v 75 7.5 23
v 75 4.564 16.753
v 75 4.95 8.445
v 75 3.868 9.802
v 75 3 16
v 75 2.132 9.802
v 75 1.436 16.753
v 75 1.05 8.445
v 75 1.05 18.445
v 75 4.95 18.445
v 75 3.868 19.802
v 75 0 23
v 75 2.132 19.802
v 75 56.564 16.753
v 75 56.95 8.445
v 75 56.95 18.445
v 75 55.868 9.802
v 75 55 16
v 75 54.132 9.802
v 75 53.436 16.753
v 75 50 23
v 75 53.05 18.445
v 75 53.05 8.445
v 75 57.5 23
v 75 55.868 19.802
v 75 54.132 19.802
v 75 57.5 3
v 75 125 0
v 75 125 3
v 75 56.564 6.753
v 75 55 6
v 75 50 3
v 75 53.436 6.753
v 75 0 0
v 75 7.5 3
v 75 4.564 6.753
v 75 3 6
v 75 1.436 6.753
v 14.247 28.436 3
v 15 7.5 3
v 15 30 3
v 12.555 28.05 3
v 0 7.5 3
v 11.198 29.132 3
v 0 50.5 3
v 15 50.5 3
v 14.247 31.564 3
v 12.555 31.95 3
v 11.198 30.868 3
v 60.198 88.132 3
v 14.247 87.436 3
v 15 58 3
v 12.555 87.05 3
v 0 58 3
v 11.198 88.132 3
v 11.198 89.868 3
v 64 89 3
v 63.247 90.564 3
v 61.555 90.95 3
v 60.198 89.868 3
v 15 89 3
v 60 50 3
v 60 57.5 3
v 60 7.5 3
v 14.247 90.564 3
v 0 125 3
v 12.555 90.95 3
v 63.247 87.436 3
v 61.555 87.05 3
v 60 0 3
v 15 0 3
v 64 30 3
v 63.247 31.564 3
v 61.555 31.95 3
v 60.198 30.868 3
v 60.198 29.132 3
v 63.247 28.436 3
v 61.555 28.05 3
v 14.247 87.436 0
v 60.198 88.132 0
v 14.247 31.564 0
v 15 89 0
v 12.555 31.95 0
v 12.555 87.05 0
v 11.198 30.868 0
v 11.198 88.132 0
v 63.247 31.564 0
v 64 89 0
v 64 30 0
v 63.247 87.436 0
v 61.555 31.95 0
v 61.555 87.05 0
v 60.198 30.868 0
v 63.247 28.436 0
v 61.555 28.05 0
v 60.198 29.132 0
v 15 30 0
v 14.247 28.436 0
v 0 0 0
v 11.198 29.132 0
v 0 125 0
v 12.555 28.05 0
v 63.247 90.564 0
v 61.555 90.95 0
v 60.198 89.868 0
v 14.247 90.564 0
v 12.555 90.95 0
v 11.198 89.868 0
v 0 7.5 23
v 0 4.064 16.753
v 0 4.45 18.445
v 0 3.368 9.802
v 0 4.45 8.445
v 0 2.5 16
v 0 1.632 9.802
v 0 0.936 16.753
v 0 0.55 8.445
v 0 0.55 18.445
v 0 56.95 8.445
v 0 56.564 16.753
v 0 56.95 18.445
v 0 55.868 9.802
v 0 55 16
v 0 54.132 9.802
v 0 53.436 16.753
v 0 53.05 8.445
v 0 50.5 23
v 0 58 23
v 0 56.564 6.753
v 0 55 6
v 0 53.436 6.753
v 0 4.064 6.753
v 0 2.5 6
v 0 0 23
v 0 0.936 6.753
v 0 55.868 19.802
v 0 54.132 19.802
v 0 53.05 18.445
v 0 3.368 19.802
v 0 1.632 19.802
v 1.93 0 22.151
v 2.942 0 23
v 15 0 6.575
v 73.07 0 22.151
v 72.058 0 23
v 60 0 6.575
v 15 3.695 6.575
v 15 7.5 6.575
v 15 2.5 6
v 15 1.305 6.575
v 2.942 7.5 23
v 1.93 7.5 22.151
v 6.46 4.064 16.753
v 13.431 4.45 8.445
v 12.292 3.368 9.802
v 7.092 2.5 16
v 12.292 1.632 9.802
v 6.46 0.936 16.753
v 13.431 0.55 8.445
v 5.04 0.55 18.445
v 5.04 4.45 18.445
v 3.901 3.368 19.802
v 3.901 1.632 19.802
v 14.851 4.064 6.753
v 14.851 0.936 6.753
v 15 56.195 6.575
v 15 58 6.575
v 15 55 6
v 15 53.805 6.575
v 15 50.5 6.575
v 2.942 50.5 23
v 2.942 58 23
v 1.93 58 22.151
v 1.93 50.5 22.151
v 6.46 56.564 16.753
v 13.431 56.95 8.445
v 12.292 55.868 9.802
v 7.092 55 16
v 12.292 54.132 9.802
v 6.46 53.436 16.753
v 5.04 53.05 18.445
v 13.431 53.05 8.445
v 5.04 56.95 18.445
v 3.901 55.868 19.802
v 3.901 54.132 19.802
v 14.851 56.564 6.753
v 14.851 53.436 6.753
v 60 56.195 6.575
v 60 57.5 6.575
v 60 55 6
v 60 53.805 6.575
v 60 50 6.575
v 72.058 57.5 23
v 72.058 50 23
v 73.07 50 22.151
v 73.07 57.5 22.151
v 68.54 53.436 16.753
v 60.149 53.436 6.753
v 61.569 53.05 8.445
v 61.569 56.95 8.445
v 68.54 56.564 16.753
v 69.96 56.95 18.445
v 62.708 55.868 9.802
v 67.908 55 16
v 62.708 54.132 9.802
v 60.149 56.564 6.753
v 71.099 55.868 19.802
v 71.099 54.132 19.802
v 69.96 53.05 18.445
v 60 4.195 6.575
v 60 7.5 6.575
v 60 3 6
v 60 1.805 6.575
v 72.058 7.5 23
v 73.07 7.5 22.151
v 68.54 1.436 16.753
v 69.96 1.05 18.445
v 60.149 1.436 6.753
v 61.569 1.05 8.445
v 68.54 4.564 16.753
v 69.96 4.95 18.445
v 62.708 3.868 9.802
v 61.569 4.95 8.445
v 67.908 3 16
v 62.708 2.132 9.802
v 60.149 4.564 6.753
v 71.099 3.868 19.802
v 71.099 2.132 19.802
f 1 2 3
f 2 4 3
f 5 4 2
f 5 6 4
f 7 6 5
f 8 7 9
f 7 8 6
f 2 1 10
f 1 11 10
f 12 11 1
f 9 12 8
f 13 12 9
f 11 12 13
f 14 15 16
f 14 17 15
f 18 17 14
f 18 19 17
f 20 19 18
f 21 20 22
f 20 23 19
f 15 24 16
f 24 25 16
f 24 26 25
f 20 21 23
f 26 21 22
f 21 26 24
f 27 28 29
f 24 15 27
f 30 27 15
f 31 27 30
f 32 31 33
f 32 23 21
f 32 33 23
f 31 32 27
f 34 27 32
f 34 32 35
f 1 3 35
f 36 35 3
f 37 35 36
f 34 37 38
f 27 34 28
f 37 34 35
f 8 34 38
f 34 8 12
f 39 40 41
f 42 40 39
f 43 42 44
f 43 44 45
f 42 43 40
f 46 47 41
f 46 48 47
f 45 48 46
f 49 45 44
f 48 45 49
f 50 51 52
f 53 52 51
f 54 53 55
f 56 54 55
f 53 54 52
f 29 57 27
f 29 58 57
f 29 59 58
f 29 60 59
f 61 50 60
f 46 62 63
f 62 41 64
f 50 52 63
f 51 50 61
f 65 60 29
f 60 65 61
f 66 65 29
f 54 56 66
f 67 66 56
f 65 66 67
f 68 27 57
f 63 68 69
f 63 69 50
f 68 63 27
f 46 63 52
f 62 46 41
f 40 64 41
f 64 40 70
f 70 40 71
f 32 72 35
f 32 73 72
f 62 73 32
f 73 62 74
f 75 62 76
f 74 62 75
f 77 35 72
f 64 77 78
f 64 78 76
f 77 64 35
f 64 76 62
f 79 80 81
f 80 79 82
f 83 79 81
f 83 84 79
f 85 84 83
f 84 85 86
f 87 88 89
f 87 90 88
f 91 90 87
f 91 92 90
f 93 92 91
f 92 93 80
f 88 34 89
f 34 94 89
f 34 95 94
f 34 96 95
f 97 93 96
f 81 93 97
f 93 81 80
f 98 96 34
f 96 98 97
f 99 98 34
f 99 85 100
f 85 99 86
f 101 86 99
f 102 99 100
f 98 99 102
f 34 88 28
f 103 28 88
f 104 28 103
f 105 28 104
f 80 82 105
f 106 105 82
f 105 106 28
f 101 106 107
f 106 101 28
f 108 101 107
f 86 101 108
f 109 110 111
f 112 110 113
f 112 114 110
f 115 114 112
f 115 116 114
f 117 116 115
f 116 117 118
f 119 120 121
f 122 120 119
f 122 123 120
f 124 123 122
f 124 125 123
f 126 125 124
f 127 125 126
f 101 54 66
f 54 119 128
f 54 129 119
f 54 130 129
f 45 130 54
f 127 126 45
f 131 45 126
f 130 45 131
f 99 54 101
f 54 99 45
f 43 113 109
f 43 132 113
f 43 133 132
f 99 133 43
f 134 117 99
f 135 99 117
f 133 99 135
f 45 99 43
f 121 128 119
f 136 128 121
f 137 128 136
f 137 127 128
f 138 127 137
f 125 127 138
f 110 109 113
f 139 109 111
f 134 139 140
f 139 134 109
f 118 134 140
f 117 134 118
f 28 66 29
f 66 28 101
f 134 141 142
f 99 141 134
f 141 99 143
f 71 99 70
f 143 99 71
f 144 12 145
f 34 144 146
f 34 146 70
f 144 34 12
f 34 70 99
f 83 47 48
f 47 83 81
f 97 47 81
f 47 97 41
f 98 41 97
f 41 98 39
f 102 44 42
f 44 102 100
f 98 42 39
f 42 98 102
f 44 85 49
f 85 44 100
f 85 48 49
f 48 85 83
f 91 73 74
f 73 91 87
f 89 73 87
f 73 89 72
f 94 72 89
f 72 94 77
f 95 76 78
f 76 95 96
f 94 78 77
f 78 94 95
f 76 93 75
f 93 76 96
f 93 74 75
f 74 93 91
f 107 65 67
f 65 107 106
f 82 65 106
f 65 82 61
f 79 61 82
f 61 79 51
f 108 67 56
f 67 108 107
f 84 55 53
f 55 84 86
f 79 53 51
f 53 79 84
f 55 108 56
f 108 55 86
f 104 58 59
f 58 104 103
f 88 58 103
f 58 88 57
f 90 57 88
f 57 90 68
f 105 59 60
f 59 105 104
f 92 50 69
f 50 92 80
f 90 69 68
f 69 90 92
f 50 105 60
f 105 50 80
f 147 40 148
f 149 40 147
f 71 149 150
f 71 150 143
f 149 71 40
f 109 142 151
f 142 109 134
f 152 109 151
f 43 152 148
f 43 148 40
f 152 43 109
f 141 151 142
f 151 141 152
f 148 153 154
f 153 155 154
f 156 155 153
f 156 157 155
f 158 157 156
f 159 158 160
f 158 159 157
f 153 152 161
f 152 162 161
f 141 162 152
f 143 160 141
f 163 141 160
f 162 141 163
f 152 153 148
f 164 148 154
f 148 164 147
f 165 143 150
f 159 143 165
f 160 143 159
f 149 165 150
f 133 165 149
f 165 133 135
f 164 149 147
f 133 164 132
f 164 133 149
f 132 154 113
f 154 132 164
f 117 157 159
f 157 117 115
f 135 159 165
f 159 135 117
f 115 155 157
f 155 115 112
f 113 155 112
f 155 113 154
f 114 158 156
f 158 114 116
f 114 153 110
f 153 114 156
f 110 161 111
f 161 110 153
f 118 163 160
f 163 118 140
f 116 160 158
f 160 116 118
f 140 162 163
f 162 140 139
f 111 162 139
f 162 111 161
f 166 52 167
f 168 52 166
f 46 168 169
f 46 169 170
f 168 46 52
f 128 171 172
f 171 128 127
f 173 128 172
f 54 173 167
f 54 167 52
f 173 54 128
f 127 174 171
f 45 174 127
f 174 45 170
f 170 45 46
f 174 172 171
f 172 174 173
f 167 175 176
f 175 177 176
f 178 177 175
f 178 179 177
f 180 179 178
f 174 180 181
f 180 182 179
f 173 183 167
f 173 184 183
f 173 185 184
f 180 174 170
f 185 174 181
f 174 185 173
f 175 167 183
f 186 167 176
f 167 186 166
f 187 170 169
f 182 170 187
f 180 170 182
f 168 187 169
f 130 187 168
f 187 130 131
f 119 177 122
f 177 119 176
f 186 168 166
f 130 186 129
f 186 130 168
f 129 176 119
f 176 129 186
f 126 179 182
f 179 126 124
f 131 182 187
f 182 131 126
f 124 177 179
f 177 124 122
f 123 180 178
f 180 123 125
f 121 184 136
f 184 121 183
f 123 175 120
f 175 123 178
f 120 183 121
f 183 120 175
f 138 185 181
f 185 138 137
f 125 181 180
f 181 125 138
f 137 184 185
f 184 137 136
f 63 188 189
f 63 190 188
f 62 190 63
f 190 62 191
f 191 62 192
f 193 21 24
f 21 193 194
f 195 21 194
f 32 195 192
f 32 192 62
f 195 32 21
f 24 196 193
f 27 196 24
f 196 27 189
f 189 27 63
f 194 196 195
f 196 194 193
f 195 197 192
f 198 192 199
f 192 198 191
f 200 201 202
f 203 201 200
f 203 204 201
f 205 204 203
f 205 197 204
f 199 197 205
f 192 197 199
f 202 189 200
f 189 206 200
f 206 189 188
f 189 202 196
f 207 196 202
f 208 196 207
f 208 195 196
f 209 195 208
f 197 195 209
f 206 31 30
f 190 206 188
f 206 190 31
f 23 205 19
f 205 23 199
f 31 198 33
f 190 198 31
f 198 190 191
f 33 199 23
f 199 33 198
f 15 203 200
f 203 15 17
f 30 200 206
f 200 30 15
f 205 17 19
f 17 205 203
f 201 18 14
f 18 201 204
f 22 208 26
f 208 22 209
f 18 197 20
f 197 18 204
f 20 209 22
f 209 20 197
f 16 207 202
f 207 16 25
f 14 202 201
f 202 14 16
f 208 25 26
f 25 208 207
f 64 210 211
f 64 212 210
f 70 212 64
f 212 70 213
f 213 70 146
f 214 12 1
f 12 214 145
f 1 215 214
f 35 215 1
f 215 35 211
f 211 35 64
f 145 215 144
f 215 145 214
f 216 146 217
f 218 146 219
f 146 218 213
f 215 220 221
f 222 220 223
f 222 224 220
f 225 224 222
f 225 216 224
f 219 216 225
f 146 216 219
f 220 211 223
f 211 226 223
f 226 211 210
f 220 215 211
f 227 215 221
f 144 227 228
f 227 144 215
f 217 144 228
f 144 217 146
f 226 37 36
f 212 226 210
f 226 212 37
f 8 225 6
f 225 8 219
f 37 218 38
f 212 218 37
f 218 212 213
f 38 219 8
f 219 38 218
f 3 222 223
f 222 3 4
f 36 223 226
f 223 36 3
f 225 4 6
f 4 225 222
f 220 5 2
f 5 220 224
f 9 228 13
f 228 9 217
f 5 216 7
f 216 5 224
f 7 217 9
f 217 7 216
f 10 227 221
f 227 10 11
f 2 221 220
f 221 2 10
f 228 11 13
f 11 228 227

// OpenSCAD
difference() {
//import("C:/Users/atlan/Downloads/robotPlate-Servo.stl");
    cube([75,125,3]);
    translate([13,30,0])cylinder(30,2,2,true);
    translate([62,30,0])cylinder(30,2,2,true);
    translate([13,89,0])cylinder(30,2,2,true);
    translate([62,89,0])cylinder(30,2,2,true);
   

}
difference() {
    cube([15,7.5,23]);
    translate([18,0,3])rotate([0,-40,0]) cube([15,7.5,25]);
    translate([0,2.5,8]) rotate([0,90,0])cylinder(40,2,2,true);
    translate([0,2.5,18]) rotate([0,90,0])cylinder(40,2,2,true);
}
translate([0,50.5,0]) difference() {
    cube([15,7.5,23]);
    translate([18,0,3])rotate([0,-40,0]) cube([15,7.5,25]);
    translate([0,4.5,8]) rotate([0,90,0])cylinder(40,2,2,true);
    translate([0,4.5,18]) rotate([0,90,0])cylinder(40,2,2,true);
}

translate([75,57.5,0])rotate([0,0,180]) difference() {
    cube([15,7.5,23]);
    translate([18,0,3]) rotate([0,-40,0]) cube([15,7.5,25]);
    translate([0,2.5,8]) rotate([0,90,0])cylinder(40,2,2,true);
    translate([0,2.5,18]) rotate([0,90,0])cylinder(40,2,2,true);
}

translate([75,7.5,0])rotate([0,0,180]) difference() {
    cube([15,7.5,23]);
    translate([18,0,3]) rotate([0,-40,0]) cube([15,7.5,25]);
    translate([0,4.5,8]) rotate([0,90,0])cylinder(40,2,2,true);
    translate([0,4.5,18]) rotate([0,90,0])cylinder(40,2,2,true);
}
